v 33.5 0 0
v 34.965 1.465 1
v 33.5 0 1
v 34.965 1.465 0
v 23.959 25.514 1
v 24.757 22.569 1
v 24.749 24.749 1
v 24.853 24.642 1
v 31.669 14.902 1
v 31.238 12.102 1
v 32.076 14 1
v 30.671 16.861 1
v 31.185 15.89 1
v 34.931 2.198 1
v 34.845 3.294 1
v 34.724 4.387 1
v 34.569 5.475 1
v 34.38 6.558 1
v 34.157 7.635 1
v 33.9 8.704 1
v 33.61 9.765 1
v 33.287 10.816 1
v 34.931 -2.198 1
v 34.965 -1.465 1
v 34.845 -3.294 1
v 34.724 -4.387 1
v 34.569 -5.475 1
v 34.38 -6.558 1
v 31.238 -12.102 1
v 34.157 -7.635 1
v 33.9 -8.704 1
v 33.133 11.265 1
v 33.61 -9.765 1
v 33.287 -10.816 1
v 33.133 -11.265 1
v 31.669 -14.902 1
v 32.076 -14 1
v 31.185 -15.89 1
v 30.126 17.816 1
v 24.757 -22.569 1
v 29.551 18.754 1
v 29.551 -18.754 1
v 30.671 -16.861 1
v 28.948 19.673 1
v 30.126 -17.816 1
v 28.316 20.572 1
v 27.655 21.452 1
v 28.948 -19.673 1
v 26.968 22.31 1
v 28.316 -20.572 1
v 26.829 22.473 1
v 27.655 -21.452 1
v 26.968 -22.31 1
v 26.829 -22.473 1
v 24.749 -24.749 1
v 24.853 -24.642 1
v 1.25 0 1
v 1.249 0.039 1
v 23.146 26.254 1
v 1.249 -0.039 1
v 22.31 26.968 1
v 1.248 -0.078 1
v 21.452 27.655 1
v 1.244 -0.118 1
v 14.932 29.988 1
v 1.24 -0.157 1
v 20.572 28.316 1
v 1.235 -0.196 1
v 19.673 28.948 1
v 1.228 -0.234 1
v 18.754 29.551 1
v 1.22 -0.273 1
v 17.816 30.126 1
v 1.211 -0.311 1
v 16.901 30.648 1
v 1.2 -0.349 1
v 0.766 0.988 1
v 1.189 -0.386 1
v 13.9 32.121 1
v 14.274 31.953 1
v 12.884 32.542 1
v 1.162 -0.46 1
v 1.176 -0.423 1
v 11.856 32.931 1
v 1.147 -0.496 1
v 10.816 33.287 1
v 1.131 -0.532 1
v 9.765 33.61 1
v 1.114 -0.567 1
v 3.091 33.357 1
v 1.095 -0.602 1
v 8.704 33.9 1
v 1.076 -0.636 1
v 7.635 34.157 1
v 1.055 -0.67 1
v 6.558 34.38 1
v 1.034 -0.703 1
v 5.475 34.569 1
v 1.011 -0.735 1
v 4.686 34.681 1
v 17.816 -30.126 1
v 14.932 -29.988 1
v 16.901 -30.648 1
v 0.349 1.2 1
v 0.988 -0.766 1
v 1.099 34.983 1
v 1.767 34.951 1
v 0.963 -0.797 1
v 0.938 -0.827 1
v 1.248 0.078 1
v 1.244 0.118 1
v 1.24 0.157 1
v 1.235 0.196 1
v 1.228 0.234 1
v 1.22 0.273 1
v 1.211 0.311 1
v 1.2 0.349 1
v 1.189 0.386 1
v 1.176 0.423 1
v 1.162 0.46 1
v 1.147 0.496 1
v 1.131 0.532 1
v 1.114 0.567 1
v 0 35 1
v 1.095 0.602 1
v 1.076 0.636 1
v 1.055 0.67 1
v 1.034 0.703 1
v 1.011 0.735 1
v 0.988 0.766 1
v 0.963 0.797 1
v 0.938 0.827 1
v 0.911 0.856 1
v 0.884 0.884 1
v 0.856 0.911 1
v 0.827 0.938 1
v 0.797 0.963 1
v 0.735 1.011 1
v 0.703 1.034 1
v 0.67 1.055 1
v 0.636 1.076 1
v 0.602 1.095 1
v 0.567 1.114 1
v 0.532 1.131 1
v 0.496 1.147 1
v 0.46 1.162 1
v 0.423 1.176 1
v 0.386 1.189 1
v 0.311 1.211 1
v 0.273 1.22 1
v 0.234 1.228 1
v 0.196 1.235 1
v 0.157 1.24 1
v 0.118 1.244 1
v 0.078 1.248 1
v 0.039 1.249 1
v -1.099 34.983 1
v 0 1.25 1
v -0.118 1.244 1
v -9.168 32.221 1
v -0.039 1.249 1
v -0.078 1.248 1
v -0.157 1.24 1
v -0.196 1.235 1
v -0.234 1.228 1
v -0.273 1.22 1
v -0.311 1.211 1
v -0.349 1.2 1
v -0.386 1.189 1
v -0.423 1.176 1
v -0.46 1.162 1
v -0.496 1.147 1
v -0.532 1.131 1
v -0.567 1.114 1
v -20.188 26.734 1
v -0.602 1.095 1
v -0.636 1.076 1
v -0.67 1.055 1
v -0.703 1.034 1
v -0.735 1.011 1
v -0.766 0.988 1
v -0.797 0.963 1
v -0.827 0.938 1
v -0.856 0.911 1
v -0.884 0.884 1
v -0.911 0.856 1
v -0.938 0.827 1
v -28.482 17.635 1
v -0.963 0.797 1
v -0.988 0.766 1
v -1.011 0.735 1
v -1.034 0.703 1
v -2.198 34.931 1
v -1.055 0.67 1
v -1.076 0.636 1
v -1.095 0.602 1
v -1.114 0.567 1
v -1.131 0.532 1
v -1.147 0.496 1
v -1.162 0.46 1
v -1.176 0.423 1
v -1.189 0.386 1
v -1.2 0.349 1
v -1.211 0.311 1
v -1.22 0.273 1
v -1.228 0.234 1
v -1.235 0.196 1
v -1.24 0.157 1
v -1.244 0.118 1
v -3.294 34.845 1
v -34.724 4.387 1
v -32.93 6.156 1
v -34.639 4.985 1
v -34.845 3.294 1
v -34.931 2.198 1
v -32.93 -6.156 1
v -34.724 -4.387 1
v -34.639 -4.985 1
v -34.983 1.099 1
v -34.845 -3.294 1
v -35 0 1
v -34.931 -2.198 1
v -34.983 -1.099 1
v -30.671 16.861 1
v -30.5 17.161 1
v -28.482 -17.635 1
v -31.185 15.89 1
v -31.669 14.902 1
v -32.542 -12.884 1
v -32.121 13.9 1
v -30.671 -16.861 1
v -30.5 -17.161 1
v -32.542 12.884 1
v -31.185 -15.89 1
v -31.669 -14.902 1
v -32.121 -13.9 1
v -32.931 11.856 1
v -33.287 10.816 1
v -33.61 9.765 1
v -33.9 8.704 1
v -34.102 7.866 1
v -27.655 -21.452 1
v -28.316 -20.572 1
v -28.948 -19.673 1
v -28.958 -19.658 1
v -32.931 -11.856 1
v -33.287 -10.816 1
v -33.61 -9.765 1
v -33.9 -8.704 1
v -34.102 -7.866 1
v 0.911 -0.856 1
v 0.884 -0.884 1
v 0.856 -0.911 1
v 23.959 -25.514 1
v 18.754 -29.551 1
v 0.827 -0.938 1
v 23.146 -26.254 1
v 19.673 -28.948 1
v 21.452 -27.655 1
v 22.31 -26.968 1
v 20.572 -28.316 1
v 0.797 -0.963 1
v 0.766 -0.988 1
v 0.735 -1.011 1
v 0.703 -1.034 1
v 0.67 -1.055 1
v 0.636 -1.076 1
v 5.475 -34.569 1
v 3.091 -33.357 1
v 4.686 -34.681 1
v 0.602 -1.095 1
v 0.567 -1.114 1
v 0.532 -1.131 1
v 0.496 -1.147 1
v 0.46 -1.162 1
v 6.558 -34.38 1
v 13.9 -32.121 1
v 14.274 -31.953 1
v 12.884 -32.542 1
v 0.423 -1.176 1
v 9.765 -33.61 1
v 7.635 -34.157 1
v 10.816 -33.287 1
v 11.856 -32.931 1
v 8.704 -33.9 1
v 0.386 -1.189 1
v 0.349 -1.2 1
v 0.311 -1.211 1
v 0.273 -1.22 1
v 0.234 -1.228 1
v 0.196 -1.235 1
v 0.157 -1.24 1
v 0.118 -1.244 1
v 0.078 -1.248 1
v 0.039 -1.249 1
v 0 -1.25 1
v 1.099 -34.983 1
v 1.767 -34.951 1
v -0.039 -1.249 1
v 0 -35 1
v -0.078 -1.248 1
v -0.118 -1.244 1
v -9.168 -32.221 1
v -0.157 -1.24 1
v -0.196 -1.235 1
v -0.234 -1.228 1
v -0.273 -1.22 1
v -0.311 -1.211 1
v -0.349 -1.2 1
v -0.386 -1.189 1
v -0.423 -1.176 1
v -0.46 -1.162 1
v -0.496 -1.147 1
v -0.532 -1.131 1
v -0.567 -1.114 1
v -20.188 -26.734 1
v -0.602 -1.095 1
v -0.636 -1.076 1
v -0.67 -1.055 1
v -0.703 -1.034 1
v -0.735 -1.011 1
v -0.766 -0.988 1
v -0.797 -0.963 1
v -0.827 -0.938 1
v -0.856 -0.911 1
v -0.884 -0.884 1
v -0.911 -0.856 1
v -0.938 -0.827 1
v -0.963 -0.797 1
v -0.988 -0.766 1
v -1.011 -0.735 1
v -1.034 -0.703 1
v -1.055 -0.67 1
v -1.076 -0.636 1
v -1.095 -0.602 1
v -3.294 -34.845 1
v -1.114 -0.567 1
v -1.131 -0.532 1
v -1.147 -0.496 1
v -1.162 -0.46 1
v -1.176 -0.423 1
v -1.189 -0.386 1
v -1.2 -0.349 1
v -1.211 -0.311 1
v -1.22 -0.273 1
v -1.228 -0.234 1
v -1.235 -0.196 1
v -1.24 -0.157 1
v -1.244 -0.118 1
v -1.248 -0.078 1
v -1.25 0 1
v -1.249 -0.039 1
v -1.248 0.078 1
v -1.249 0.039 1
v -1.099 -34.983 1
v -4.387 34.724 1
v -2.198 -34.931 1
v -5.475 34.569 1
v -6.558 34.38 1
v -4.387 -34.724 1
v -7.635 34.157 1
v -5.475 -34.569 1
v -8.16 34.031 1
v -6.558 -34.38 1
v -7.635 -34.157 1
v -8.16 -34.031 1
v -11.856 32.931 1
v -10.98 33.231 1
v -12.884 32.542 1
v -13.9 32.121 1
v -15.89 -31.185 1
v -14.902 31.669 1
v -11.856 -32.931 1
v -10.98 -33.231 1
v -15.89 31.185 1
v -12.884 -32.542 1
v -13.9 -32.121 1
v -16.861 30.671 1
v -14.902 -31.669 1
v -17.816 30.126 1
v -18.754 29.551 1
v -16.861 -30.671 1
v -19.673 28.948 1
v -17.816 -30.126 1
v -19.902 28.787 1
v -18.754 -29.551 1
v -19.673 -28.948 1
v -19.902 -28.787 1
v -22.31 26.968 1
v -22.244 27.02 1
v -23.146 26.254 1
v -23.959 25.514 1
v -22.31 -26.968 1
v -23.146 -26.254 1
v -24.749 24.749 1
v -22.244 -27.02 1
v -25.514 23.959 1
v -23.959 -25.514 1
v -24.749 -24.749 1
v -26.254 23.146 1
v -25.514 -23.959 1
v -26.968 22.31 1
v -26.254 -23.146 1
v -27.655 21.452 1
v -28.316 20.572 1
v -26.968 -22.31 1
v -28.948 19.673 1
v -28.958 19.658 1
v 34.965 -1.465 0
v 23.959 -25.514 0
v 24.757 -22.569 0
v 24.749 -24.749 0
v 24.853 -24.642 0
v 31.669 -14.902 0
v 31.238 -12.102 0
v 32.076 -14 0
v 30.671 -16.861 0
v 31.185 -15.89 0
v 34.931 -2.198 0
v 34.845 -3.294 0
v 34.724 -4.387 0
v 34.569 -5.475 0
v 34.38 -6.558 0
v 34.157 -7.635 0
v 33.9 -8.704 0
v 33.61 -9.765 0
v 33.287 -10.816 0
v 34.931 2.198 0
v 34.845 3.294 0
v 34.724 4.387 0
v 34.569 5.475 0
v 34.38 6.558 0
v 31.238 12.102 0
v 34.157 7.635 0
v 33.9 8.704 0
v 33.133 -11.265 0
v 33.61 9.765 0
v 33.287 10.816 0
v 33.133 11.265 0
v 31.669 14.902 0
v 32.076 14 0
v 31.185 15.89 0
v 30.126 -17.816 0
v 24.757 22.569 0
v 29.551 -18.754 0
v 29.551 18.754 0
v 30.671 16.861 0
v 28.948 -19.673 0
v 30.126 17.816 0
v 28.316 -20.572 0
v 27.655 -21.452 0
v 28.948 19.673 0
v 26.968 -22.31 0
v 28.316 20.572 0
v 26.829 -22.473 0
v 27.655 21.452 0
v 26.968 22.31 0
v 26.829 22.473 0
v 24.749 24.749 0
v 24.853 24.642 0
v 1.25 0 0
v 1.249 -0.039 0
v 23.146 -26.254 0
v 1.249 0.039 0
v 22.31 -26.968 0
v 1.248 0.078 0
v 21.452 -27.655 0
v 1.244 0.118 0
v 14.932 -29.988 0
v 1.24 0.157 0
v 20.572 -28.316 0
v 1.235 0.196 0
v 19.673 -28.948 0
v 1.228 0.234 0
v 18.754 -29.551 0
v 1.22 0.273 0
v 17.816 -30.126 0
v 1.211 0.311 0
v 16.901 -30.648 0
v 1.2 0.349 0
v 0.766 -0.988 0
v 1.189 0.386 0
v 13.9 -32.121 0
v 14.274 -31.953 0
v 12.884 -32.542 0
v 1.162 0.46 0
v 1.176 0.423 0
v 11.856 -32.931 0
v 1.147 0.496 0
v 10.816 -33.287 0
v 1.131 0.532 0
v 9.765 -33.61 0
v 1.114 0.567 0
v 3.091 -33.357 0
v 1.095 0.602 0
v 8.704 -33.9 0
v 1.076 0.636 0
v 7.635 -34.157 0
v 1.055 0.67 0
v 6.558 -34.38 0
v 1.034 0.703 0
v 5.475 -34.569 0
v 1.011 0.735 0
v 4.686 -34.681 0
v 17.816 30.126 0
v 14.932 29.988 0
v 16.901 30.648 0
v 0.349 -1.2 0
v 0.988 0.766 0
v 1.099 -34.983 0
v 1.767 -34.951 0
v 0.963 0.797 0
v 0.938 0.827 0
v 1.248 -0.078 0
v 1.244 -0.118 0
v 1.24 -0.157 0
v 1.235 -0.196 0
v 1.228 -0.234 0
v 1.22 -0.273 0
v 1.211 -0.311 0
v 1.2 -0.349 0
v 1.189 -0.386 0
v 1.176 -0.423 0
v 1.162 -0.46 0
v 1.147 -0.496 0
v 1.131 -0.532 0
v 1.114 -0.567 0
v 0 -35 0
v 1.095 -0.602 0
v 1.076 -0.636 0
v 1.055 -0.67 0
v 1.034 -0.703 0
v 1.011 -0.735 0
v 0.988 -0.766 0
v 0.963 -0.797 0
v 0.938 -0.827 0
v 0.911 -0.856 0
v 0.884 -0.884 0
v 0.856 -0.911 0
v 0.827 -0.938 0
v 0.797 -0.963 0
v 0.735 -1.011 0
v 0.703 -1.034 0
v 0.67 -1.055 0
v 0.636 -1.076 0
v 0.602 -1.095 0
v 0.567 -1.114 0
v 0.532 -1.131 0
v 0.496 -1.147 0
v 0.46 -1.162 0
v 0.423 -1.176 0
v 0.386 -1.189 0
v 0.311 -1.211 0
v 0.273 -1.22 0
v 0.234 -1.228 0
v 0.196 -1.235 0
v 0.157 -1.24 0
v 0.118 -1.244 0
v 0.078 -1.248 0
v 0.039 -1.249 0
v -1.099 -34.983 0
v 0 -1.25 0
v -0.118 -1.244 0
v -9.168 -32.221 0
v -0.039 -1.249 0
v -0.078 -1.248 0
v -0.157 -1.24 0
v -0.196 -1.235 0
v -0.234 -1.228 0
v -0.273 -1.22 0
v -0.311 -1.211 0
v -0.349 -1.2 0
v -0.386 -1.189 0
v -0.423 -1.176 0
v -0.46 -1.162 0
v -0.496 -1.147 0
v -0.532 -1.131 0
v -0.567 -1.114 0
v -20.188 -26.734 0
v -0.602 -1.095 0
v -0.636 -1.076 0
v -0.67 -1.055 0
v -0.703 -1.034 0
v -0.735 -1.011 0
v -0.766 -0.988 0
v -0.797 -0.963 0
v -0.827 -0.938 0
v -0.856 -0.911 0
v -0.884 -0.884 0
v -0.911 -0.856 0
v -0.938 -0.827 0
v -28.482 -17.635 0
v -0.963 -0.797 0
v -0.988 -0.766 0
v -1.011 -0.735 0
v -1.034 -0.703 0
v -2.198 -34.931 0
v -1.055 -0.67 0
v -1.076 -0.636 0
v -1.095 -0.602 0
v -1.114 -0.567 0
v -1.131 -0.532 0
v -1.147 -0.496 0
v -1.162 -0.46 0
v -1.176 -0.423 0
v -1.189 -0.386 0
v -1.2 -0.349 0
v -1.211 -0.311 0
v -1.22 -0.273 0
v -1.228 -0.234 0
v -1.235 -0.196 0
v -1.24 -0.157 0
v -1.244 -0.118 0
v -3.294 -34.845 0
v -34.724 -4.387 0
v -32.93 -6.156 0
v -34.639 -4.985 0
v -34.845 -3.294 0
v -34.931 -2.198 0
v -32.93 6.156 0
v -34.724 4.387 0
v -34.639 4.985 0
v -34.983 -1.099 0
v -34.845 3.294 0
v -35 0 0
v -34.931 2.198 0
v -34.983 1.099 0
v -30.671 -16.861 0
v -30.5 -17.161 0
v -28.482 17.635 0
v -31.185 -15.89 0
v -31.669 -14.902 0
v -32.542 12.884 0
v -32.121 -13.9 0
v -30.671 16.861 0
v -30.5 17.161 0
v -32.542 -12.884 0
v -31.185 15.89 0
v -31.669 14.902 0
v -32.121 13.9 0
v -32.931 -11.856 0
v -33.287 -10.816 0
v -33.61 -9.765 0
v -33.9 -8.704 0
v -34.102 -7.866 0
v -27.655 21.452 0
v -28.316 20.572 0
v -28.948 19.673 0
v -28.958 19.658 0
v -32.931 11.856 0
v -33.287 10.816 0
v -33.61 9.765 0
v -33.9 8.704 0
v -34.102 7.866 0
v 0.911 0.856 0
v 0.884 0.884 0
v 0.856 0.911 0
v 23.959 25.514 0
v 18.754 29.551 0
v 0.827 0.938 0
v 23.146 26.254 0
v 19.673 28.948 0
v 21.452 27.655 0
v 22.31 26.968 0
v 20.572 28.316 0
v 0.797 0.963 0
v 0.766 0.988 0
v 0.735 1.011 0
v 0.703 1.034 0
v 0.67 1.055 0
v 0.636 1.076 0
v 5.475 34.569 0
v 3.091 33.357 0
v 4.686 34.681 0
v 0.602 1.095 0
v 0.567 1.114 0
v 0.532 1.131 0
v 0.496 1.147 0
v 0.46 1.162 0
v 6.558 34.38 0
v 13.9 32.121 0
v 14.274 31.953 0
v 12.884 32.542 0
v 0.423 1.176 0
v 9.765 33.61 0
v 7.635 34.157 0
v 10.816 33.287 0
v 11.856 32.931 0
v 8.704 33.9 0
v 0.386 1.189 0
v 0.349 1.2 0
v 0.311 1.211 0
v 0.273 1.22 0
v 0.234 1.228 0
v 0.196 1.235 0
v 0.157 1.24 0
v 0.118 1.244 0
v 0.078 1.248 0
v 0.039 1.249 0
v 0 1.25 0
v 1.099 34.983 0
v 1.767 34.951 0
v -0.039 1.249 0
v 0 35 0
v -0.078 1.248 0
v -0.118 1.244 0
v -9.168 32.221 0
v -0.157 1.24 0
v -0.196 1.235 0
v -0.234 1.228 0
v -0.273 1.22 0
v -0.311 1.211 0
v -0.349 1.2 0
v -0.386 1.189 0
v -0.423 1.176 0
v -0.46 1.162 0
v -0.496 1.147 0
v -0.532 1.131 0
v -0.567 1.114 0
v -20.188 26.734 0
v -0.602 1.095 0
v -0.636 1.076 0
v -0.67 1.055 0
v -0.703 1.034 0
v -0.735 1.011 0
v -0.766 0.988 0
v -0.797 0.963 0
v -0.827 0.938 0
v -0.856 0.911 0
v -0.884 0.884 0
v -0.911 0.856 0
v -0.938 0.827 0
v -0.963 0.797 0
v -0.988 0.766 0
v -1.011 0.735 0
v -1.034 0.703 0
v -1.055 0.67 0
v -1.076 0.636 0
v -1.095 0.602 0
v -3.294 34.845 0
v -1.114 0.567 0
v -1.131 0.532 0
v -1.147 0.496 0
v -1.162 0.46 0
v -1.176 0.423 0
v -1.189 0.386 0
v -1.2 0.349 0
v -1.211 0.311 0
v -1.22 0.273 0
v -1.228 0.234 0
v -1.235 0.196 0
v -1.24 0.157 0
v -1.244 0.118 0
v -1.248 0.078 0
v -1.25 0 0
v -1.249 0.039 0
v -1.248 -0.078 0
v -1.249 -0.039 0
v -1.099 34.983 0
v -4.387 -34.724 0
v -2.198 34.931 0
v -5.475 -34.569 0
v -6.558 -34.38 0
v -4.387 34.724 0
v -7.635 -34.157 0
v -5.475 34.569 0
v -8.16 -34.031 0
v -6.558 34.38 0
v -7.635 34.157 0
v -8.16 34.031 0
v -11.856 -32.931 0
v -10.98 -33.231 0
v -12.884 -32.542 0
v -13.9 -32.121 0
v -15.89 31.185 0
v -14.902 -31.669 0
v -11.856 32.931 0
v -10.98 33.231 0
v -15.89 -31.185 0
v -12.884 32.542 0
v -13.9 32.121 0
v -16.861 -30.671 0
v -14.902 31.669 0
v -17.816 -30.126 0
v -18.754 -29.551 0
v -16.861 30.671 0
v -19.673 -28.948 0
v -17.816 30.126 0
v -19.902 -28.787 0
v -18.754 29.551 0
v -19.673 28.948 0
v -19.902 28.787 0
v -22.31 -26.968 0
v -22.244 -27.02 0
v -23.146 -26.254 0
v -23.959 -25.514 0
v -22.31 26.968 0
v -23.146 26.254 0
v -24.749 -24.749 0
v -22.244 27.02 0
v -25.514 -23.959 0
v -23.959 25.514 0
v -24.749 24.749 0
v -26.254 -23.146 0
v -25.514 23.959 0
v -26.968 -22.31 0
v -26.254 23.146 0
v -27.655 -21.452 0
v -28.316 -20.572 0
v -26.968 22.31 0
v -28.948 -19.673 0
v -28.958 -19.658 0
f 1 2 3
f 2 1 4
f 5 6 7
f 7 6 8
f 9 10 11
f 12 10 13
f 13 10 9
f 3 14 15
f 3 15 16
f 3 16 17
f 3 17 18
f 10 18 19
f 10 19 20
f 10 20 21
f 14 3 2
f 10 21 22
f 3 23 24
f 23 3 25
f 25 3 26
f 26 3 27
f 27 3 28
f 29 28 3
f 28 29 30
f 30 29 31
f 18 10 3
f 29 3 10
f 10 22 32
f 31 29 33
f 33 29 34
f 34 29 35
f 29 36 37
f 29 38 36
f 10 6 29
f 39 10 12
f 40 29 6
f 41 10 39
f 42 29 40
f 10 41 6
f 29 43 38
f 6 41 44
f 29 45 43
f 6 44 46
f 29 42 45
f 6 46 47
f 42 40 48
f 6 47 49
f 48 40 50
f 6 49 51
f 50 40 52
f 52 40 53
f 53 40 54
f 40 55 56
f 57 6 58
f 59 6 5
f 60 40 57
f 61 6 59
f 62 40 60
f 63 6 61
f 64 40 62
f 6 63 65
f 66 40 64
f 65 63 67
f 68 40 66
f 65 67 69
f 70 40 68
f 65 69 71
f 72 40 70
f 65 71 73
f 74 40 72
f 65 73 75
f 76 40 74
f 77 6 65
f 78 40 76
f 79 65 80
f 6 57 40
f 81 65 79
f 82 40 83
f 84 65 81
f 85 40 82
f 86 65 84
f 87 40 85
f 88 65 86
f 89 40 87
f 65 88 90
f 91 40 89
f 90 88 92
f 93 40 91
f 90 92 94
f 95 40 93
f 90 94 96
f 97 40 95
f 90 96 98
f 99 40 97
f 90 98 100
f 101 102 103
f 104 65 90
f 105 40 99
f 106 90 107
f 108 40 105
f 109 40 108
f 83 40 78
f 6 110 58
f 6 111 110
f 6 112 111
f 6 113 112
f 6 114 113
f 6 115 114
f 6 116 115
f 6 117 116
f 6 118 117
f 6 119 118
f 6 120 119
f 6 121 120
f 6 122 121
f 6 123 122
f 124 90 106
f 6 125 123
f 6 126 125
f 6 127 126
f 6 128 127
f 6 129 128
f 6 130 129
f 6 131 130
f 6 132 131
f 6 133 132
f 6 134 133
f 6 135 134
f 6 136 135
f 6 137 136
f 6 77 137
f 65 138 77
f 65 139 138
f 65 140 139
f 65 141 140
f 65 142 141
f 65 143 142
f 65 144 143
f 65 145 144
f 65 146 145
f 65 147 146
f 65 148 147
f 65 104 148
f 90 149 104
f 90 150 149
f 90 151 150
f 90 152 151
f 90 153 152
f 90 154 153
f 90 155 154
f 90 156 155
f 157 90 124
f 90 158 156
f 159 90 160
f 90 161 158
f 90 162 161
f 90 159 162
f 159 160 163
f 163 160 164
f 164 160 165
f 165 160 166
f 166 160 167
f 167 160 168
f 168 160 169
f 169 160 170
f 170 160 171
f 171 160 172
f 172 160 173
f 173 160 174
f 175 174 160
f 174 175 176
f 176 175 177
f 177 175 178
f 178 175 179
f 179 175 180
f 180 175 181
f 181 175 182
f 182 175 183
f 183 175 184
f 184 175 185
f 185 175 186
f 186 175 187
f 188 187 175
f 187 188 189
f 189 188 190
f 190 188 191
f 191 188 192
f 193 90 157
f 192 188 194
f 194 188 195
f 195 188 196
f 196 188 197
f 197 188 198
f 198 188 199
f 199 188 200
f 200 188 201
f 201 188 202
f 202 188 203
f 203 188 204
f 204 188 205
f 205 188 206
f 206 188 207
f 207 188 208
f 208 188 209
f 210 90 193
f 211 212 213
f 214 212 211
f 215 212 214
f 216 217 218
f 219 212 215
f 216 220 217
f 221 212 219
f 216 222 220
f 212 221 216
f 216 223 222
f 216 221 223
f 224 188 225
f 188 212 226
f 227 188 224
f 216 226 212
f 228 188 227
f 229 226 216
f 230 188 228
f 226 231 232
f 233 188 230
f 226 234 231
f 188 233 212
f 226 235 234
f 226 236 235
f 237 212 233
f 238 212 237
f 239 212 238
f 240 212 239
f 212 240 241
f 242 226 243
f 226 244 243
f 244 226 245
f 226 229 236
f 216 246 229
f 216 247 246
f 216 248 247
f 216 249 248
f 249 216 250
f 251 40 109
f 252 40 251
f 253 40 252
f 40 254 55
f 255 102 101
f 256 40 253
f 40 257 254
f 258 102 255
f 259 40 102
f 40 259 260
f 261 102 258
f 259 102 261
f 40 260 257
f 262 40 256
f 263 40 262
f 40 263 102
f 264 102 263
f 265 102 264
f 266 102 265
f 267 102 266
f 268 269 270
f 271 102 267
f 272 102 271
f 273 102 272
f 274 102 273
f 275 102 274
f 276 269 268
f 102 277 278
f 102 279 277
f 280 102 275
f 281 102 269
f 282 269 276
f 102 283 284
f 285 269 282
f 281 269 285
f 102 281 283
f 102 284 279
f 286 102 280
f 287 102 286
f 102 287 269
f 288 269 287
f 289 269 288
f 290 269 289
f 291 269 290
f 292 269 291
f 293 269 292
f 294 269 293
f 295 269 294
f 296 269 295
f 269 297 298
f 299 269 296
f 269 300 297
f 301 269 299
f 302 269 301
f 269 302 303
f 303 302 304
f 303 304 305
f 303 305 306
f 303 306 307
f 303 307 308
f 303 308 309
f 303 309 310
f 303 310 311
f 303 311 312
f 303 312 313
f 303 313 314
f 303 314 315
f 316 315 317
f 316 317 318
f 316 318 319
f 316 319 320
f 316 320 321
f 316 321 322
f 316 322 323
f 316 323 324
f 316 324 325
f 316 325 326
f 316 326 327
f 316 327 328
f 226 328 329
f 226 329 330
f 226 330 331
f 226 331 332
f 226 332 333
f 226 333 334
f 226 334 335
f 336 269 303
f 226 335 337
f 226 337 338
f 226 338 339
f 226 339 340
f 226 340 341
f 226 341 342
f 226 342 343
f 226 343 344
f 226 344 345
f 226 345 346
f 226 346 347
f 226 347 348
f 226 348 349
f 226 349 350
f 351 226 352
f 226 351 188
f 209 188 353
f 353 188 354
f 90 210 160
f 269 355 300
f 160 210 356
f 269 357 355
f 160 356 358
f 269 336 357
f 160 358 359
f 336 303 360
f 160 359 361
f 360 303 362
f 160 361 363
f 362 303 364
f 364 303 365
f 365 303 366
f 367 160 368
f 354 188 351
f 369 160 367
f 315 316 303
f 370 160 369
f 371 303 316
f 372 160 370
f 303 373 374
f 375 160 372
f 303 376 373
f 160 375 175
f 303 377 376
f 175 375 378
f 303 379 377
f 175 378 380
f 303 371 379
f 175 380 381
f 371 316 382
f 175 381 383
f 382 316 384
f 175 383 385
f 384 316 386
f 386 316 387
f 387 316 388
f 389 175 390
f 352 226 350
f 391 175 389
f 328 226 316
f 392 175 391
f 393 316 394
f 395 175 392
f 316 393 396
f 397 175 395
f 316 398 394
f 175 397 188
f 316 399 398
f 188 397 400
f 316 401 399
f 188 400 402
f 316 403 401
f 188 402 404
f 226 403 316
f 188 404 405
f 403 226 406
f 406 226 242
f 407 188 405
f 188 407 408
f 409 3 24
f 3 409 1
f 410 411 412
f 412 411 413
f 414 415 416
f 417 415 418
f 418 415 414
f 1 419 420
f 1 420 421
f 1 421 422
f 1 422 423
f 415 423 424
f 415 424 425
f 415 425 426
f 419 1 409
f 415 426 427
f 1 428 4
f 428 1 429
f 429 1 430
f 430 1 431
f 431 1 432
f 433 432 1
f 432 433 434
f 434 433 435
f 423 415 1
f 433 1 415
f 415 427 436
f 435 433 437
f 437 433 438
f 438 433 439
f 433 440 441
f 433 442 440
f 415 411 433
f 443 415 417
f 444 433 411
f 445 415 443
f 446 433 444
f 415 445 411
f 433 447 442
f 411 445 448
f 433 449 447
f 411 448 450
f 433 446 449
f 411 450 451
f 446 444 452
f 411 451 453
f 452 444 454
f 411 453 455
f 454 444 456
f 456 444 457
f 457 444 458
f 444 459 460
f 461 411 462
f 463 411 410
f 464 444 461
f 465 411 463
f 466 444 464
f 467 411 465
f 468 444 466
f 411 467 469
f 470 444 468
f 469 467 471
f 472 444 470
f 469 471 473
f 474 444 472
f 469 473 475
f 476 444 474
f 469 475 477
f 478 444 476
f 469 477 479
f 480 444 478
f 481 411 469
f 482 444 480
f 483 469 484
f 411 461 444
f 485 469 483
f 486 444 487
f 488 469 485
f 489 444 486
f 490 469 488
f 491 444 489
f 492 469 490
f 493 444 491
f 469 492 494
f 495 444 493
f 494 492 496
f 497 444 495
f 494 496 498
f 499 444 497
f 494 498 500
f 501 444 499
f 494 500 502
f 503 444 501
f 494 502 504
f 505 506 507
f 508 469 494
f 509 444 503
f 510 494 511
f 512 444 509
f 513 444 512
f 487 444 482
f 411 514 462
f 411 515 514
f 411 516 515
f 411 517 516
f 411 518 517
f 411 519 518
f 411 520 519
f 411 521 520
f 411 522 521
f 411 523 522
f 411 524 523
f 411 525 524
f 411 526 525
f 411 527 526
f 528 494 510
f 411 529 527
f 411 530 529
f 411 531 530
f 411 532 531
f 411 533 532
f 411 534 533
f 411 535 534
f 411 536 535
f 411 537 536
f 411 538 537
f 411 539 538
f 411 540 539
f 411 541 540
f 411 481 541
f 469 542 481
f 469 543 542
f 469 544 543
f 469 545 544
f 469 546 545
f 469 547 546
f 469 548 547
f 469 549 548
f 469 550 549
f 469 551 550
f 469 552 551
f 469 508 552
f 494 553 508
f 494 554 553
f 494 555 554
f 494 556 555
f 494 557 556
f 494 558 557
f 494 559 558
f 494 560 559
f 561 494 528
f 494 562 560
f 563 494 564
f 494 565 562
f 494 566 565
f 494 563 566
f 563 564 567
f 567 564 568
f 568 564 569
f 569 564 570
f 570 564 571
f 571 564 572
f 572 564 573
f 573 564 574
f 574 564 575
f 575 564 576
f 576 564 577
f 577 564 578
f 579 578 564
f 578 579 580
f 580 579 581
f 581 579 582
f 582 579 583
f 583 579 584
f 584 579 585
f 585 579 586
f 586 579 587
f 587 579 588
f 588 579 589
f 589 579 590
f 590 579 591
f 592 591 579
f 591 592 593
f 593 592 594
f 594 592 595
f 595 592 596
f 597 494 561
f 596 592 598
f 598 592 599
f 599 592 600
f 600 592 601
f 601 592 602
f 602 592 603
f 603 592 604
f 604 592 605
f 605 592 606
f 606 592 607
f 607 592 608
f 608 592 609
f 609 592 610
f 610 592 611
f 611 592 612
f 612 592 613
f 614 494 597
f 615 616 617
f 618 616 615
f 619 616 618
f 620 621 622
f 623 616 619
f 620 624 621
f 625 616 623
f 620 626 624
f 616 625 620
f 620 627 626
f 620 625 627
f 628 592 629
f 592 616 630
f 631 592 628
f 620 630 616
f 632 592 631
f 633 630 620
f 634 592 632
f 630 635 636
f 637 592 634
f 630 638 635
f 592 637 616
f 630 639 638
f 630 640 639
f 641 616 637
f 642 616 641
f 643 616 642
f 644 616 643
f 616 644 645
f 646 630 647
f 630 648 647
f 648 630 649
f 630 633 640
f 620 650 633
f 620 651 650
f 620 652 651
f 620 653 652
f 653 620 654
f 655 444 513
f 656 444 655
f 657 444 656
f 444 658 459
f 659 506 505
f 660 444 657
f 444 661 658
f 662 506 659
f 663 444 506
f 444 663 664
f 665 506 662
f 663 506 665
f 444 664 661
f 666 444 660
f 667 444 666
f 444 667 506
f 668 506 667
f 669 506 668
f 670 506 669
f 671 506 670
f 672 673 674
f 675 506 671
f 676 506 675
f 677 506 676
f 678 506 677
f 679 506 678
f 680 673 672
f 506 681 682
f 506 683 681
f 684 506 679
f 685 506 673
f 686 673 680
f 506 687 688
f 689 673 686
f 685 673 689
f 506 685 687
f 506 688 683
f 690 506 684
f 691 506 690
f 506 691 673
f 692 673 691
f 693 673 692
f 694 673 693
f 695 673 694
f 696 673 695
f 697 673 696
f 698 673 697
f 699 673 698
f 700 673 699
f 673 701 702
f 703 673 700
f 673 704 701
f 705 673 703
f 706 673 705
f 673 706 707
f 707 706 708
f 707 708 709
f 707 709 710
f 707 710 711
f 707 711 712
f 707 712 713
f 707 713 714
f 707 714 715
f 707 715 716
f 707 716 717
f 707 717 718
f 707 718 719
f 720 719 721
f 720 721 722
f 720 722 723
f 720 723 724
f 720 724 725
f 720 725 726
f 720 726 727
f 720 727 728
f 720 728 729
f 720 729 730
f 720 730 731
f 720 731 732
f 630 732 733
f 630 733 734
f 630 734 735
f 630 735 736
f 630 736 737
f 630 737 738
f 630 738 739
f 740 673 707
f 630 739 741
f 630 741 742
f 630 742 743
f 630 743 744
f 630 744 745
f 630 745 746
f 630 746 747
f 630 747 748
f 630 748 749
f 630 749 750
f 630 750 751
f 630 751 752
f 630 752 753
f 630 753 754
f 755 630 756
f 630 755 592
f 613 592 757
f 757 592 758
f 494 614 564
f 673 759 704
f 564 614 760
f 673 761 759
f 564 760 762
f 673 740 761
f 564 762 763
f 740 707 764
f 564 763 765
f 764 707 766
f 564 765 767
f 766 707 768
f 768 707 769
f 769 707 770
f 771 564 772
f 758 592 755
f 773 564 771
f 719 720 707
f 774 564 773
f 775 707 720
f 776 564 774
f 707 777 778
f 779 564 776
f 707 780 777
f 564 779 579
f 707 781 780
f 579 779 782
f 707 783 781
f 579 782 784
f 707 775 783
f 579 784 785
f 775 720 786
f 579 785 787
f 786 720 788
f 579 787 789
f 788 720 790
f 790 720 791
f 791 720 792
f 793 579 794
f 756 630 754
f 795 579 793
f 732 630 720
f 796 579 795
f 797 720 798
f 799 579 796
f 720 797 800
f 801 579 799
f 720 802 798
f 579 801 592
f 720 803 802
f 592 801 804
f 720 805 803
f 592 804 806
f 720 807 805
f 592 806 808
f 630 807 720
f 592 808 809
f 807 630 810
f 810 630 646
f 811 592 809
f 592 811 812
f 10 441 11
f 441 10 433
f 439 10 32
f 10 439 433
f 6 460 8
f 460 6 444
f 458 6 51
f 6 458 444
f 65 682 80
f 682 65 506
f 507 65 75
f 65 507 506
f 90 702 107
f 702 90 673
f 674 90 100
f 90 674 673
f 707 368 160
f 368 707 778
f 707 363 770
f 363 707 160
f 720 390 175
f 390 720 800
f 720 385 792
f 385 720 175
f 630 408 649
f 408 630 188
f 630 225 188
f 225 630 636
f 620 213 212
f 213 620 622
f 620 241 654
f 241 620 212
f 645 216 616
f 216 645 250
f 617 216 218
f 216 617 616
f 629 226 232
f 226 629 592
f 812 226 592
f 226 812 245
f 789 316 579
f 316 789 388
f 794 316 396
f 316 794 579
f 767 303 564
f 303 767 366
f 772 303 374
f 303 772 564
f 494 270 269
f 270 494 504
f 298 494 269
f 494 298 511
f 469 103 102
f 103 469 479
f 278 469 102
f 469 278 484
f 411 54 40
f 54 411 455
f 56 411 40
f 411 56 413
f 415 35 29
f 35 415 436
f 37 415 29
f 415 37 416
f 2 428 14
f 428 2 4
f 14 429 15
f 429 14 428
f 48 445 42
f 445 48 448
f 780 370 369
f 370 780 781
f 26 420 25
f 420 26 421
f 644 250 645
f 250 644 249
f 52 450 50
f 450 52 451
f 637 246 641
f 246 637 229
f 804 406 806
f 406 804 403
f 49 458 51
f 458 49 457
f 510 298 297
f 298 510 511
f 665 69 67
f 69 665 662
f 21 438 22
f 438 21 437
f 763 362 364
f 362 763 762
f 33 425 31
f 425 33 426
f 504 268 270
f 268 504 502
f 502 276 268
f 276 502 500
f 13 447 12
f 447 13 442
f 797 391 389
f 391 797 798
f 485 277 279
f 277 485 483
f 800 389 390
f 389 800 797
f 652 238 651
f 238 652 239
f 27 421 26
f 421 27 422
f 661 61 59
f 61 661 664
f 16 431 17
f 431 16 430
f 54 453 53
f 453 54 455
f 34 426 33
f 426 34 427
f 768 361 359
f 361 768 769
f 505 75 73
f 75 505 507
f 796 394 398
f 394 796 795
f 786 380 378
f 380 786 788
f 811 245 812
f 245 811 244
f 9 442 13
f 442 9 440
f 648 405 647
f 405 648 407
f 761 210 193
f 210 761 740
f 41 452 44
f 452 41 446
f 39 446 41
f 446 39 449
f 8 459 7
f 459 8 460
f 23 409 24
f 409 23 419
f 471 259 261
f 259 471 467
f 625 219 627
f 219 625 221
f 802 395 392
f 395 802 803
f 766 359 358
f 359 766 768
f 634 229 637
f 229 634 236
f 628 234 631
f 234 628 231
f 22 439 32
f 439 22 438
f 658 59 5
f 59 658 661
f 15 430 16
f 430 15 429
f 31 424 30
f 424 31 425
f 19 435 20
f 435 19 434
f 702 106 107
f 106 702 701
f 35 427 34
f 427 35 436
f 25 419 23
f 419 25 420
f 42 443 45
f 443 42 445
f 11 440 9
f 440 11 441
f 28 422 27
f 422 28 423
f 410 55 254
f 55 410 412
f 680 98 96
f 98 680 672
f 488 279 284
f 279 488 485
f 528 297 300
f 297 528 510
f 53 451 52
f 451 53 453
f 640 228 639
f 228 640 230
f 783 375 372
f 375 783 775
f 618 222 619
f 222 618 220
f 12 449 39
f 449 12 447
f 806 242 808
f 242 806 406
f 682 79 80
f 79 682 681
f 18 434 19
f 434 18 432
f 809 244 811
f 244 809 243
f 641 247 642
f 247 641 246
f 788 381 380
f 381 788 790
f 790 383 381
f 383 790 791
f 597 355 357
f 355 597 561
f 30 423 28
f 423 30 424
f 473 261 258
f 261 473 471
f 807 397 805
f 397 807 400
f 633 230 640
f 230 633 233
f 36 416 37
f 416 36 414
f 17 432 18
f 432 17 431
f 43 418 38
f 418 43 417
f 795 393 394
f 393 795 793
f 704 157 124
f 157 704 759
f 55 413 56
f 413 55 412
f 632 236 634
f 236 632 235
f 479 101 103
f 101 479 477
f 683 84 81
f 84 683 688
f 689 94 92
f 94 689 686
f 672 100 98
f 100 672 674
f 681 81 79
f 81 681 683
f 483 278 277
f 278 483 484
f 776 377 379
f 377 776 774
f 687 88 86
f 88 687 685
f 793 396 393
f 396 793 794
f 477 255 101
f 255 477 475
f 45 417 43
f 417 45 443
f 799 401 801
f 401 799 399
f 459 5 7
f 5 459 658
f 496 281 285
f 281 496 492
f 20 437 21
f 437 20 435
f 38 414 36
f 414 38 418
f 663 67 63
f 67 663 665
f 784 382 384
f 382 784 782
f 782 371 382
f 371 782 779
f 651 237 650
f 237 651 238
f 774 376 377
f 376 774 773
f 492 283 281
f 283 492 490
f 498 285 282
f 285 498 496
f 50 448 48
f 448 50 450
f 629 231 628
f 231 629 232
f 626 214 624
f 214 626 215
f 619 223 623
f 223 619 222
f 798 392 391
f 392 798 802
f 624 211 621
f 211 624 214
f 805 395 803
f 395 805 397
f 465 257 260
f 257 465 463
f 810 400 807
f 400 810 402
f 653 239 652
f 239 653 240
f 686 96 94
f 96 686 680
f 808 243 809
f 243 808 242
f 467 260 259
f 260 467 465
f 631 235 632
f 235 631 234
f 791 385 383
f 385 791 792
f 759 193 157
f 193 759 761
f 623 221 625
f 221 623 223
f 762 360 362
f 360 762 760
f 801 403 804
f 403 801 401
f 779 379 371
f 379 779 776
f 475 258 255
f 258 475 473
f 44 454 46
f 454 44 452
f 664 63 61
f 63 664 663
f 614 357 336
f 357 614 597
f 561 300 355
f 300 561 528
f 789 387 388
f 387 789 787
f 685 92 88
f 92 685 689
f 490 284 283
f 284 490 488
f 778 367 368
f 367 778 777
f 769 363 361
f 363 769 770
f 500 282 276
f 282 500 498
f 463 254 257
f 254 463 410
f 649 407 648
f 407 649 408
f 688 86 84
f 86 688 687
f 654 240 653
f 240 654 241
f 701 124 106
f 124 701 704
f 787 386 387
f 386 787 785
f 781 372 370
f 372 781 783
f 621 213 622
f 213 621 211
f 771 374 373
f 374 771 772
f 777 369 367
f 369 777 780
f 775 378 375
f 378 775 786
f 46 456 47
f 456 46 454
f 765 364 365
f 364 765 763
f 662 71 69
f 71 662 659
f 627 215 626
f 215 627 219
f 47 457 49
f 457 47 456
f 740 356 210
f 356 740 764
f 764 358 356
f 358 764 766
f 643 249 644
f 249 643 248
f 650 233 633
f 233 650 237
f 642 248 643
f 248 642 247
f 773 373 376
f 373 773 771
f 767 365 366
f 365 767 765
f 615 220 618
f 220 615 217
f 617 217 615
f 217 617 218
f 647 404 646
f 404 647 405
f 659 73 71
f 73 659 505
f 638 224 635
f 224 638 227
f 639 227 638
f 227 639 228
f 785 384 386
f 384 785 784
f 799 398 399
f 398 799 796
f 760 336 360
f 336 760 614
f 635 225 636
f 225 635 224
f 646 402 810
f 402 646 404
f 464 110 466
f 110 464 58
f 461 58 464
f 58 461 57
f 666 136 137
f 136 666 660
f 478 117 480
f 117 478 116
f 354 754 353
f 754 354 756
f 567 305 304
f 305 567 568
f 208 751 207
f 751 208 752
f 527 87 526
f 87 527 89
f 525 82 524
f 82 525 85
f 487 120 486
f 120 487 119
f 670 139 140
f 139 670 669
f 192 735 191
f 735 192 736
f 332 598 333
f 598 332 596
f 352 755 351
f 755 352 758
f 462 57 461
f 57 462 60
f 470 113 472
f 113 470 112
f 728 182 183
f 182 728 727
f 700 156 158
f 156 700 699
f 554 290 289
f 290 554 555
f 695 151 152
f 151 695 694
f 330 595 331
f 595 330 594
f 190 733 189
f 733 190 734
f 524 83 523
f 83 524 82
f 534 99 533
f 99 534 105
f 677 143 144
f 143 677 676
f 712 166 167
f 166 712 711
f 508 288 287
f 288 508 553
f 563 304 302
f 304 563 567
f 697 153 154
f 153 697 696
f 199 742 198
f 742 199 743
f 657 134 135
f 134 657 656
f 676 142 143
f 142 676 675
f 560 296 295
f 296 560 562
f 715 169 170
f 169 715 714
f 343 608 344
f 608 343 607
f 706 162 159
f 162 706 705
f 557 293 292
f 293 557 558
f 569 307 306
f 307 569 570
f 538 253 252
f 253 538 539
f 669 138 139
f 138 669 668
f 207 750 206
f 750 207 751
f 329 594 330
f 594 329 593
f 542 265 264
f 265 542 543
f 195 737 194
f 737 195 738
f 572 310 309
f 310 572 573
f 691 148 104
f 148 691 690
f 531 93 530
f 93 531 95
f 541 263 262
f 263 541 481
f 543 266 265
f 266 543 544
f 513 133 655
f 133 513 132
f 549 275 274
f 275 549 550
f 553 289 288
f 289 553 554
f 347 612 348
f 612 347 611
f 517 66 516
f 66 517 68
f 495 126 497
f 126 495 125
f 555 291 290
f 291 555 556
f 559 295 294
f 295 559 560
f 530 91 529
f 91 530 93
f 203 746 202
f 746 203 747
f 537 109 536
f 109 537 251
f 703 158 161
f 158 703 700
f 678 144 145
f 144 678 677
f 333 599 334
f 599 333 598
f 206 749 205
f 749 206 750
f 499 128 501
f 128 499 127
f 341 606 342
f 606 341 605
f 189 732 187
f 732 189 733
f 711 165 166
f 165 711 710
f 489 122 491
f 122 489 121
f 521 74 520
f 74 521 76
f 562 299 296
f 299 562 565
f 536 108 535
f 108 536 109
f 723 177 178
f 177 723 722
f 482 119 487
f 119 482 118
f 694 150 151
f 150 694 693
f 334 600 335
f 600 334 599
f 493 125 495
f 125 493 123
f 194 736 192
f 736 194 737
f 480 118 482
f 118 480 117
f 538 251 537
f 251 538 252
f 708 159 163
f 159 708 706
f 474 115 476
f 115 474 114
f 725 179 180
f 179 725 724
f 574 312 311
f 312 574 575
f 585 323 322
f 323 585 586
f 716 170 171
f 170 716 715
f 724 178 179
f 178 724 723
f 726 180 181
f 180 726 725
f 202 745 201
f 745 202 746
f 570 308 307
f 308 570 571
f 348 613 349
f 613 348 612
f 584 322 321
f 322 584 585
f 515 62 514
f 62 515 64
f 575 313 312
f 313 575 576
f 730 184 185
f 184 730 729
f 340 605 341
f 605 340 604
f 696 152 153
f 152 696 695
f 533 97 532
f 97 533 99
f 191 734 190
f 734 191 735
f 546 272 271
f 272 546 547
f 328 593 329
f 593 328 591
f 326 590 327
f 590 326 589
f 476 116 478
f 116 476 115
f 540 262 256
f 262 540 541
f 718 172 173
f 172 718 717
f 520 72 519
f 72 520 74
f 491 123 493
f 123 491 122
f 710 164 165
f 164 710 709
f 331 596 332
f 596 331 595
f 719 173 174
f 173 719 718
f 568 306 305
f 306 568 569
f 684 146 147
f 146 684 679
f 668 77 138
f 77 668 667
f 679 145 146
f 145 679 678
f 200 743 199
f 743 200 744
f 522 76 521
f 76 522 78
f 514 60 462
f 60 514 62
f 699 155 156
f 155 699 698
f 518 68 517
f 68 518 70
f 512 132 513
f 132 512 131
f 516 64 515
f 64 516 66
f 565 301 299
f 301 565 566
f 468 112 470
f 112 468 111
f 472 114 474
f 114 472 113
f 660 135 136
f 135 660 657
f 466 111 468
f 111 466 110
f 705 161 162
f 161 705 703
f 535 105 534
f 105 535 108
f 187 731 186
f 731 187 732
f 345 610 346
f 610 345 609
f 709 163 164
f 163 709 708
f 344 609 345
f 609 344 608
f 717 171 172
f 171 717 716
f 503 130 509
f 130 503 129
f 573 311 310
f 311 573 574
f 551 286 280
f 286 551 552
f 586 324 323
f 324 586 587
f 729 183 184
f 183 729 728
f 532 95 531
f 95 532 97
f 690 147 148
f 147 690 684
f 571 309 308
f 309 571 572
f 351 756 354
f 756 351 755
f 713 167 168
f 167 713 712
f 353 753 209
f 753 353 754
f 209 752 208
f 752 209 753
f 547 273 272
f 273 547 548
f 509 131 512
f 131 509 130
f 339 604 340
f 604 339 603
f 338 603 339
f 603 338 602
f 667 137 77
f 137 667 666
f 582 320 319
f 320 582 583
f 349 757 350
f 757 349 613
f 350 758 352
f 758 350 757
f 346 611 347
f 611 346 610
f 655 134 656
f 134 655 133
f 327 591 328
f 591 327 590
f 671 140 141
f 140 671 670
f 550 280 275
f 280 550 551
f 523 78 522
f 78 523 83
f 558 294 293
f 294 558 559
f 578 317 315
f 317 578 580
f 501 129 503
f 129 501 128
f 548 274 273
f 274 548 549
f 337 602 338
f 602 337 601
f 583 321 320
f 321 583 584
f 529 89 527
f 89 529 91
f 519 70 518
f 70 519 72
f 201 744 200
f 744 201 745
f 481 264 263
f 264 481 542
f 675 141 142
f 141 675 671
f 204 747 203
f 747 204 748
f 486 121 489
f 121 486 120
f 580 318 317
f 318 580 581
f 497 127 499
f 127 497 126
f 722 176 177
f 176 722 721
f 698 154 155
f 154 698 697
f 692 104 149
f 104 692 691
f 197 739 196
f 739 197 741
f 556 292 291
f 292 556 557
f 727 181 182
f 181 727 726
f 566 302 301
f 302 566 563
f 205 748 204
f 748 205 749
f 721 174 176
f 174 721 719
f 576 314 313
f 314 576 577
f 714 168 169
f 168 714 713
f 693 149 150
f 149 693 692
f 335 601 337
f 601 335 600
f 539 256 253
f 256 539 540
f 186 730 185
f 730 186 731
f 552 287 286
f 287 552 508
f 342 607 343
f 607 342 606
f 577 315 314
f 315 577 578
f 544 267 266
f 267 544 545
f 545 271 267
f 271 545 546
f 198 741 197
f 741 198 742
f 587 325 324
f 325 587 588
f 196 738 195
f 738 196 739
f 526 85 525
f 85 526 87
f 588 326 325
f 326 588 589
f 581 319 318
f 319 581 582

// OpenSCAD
template_r = 35;
center_hole_r = 1.25;
height = 1;

number_of_outer_holes = 17;
outer_hole_r = 1.5;

$fn = 200;

difference() {
    cylinder(h = height, r = template_r);
    cylinder(h = height, r = center_hole_r);

    for (i = [0 : number_of_outer_holes]) {        
        rotate(i * (360 / number_of_outer_holes)) {
            translate([template_r, 0, 0]) {
                cylinder(h = height, r = outer_hole_r, $fn = 4);
            }
        }
    }

}
